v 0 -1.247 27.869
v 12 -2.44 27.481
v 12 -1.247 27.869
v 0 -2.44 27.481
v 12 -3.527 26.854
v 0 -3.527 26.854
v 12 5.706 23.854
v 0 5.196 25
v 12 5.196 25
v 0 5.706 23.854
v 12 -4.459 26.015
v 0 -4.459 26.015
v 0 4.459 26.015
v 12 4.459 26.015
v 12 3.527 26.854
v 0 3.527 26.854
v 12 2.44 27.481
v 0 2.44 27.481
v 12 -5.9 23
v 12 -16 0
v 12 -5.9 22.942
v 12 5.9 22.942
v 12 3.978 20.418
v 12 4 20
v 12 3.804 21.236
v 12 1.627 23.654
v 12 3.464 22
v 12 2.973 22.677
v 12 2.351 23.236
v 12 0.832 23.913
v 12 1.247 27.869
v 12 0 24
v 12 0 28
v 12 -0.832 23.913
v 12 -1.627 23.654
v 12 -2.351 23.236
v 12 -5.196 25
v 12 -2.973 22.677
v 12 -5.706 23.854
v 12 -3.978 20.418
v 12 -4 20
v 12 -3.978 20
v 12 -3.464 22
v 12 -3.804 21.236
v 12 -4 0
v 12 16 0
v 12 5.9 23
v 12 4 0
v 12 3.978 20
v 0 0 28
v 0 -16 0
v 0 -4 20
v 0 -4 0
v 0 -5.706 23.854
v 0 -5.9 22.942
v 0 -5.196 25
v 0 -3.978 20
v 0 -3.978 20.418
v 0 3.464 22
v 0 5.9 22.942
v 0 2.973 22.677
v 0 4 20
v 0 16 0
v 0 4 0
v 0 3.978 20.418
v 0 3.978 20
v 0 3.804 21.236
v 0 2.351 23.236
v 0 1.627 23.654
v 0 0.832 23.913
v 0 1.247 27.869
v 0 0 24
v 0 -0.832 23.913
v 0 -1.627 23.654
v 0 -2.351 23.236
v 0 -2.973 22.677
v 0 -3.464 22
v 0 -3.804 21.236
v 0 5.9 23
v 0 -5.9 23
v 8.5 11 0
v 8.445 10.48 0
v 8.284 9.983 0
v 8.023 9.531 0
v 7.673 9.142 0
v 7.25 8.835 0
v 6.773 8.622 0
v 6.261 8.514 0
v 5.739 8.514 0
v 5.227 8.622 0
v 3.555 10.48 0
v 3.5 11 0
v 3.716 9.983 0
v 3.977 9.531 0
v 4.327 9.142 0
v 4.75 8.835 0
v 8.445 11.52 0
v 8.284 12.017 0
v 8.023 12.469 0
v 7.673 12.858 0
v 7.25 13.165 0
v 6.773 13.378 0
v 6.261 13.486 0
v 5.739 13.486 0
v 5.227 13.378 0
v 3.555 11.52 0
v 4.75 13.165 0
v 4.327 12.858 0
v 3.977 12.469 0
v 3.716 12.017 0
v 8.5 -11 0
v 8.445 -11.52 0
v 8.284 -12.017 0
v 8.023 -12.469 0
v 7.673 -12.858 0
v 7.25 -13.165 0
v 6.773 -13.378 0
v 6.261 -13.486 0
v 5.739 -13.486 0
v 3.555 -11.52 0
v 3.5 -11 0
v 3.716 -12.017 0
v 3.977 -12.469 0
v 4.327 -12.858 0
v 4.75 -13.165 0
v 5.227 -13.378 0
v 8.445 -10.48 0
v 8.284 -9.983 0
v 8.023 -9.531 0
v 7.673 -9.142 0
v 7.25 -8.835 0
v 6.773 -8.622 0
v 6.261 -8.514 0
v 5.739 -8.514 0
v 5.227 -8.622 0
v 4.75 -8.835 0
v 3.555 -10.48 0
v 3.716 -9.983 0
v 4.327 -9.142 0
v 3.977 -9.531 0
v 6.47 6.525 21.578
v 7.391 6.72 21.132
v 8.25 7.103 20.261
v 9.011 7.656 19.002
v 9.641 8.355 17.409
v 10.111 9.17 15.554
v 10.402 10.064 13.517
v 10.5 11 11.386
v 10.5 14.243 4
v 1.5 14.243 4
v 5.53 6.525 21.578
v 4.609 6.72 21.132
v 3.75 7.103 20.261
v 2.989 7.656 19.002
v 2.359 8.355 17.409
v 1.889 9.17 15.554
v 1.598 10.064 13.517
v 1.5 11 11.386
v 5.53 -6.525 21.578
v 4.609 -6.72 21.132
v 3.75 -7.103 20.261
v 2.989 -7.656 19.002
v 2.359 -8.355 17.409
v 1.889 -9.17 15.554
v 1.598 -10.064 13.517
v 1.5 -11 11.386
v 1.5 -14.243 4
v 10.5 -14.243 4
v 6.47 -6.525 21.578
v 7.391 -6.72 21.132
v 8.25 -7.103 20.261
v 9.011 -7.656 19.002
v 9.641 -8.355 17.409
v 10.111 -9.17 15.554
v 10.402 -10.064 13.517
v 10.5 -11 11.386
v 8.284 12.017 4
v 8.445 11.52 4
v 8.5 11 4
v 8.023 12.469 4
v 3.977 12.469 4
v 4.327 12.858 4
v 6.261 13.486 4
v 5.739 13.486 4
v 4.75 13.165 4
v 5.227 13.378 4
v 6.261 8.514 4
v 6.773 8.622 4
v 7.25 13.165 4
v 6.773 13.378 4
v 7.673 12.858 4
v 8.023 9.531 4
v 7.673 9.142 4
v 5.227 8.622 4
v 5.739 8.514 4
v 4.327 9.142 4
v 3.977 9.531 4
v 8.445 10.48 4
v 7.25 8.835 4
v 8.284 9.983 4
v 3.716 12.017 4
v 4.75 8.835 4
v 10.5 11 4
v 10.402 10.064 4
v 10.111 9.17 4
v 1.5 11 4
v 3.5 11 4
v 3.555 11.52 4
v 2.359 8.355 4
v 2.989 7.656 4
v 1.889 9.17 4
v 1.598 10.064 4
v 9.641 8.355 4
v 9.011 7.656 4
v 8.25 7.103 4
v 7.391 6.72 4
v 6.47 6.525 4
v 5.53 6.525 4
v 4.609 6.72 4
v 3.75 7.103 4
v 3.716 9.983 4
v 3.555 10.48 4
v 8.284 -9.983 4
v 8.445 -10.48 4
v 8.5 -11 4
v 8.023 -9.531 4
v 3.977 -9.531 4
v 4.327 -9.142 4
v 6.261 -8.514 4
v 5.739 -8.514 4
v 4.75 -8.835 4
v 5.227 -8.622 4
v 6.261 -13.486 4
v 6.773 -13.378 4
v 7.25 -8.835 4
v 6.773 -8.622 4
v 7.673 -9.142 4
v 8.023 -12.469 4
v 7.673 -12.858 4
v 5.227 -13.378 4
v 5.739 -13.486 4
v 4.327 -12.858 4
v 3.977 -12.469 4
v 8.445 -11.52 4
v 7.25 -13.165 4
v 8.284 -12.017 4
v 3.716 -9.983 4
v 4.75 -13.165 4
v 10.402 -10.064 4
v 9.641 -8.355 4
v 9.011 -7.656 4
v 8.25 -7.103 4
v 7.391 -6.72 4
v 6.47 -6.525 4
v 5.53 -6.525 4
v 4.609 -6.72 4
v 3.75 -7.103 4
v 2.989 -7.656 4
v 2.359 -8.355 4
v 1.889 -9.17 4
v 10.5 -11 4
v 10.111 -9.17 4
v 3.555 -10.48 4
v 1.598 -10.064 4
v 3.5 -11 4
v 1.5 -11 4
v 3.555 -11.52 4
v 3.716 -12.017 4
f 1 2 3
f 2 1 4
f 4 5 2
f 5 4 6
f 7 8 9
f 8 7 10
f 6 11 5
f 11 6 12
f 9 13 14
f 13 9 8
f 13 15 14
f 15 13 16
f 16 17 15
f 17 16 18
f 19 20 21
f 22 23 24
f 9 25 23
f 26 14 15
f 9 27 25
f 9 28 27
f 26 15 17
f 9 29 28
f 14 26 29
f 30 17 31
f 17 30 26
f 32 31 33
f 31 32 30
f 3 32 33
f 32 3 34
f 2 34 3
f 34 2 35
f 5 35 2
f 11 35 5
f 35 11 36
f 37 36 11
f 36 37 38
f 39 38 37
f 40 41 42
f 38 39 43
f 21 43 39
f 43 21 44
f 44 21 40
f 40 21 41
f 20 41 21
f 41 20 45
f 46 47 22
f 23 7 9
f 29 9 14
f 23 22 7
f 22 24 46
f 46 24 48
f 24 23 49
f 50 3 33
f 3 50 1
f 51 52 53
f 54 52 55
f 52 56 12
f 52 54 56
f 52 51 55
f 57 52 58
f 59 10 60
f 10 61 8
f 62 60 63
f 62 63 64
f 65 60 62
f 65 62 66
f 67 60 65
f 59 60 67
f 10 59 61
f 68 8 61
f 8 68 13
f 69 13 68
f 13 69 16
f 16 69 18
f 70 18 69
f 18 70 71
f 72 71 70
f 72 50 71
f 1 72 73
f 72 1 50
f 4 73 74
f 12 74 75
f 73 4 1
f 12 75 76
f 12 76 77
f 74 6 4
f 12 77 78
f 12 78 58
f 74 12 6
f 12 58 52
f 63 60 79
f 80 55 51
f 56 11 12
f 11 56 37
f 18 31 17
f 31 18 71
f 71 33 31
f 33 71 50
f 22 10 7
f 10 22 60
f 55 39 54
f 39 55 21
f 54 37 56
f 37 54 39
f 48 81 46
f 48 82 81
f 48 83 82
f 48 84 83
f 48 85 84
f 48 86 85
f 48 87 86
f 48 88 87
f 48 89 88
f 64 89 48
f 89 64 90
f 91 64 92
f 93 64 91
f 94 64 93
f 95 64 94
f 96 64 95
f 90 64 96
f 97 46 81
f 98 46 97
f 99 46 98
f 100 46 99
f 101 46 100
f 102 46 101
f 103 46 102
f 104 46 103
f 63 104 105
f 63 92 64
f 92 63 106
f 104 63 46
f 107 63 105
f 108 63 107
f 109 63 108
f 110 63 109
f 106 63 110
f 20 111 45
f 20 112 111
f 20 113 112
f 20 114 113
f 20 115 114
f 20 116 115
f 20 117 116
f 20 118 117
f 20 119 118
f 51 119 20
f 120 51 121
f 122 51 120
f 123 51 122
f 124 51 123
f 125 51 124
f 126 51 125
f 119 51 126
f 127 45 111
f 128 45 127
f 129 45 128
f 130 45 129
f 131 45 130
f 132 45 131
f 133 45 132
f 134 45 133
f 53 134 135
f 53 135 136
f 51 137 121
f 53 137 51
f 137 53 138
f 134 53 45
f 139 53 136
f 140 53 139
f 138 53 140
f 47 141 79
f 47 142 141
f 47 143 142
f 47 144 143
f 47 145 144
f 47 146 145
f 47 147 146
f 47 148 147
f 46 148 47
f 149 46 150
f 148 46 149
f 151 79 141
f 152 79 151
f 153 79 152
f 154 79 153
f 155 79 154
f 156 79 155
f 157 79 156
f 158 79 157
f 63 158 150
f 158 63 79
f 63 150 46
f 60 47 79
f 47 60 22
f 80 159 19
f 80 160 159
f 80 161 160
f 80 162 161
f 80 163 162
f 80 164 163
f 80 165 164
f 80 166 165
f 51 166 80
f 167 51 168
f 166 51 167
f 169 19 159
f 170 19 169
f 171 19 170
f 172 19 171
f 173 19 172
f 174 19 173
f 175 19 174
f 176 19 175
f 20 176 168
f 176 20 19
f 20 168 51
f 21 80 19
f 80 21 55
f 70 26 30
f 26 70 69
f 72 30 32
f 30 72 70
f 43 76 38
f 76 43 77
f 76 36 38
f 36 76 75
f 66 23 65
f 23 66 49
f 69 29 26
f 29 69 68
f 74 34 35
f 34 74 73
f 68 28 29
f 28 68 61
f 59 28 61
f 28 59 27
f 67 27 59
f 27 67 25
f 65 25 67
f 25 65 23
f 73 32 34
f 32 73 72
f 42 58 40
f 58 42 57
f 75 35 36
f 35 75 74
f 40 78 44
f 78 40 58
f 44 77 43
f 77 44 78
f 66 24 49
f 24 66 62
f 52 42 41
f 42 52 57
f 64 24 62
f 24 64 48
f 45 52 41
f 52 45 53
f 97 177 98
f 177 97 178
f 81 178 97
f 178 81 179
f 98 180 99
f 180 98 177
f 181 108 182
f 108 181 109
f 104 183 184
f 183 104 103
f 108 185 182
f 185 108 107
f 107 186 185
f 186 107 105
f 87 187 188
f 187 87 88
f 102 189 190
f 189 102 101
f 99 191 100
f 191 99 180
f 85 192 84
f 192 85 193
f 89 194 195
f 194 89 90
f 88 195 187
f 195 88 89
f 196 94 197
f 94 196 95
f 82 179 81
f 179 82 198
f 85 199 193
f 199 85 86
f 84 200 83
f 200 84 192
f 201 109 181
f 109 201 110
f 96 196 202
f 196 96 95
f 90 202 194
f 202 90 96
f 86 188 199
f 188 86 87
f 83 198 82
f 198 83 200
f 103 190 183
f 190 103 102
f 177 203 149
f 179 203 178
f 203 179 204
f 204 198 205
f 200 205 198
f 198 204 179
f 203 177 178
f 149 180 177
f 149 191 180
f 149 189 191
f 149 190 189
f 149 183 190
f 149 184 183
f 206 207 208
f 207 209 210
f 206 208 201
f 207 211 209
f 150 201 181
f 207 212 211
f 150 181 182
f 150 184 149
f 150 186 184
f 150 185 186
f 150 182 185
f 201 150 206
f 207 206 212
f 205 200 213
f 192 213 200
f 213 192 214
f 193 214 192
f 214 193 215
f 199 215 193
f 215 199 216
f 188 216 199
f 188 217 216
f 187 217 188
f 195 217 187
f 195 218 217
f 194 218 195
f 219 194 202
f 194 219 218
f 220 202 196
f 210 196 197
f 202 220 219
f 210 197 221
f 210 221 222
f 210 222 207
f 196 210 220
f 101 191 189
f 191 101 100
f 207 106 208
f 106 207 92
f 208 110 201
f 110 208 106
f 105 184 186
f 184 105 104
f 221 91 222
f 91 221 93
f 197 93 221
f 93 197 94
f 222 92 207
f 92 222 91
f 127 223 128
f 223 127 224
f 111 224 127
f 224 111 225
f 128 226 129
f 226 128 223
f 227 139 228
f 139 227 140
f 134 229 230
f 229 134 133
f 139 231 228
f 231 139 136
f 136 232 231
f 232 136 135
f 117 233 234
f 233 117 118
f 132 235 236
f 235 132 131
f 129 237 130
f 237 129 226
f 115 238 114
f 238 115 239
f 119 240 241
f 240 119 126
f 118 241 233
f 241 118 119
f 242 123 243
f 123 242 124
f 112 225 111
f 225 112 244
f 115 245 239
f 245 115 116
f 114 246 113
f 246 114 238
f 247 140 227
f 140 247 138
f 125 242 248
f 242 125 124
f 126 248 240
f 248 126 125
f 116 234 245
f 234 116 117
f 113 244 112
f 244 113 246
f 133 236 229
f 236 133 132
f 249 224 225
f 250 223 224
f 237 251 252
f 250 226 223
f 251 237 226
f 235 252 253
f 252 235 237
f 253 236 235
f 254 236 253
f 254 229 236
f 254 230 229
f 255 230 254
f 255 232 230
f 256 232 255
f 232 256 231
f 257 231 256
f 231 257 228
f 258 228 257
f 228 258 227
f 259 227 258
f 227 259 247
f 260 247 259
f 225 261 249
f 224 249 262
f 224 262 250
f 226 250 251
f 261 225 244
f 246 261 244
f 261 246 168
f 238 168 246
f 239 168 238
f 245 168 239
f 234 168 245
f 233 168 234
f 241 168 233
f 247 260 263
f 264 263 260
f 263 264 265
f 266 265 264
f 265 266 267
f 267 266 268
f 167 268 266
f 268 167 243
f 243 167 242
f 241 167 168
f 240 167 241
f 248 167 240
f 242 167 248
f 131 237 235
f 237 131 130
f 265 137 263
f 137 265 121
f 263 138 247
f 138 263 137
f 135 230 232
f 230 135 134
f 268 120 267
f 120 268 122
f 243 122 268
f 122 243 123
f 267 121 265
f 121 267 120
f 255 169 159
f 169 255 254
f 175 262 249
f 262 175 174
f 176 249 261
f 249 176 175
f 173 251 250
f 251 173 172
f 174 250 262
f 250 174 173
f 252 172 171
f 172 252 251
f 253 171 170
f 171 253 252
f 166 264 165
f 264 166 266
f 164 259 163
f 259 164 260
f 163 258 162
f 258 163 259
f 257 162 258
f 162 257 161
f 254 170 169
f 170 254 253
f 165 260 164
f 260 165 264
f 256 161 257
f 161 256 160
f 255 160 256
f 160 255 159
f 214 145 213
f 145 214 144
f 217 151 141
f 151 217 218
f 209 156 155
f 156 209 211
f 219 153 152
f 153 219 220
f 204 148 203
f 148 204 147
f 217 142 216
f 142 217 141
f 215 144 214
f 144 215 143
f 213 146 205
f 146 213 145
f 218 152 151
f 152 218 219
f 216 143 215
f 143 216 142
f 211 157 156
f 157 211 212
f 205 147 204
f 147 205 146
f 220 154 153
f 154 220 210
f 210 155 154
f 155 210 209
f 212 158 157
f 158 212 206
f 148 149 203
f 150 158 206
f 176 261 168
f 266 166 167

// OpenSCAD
$fn     =   30;
L       =   12;

difference(){
union(){
translate([0,0,22]) rotate([0,90,0]) cylinder(L,6,6);
translate([0,-6,0]) cube([L,12,22]);
translate([0,6,0]) rotate([90,0,90]) linear_extrude(L) polygon([[0,0], [10,0], [-0.1,23]]);
translate([L,-6,0]) rotate([90,0,-90]) linear_extrude(L) polygon([[0,0], [10,0], [-0.1,23]]);
}
union(){
translate([0,0,20]) rotate([0,90,0]) cylinder(L,4,4);
translate([0,-4,0]) cube([L,8,20]);
translate([L/2,11,0]) cylinder(4,2.5,2.5);
translate([L/2,-11,0]) cylinder(4,2.5,2.5);
translate([L/2,-11,4]) cylinder(20,4.5,4.5);
translate([L/2,11,4]) cylinder(20,4.5,4.5);
translate([L/2-4.5,11,4]) cube(9,5,20);
translate([L/2-4.5,-11-9,4]) cube(9,5,20);
}
}
